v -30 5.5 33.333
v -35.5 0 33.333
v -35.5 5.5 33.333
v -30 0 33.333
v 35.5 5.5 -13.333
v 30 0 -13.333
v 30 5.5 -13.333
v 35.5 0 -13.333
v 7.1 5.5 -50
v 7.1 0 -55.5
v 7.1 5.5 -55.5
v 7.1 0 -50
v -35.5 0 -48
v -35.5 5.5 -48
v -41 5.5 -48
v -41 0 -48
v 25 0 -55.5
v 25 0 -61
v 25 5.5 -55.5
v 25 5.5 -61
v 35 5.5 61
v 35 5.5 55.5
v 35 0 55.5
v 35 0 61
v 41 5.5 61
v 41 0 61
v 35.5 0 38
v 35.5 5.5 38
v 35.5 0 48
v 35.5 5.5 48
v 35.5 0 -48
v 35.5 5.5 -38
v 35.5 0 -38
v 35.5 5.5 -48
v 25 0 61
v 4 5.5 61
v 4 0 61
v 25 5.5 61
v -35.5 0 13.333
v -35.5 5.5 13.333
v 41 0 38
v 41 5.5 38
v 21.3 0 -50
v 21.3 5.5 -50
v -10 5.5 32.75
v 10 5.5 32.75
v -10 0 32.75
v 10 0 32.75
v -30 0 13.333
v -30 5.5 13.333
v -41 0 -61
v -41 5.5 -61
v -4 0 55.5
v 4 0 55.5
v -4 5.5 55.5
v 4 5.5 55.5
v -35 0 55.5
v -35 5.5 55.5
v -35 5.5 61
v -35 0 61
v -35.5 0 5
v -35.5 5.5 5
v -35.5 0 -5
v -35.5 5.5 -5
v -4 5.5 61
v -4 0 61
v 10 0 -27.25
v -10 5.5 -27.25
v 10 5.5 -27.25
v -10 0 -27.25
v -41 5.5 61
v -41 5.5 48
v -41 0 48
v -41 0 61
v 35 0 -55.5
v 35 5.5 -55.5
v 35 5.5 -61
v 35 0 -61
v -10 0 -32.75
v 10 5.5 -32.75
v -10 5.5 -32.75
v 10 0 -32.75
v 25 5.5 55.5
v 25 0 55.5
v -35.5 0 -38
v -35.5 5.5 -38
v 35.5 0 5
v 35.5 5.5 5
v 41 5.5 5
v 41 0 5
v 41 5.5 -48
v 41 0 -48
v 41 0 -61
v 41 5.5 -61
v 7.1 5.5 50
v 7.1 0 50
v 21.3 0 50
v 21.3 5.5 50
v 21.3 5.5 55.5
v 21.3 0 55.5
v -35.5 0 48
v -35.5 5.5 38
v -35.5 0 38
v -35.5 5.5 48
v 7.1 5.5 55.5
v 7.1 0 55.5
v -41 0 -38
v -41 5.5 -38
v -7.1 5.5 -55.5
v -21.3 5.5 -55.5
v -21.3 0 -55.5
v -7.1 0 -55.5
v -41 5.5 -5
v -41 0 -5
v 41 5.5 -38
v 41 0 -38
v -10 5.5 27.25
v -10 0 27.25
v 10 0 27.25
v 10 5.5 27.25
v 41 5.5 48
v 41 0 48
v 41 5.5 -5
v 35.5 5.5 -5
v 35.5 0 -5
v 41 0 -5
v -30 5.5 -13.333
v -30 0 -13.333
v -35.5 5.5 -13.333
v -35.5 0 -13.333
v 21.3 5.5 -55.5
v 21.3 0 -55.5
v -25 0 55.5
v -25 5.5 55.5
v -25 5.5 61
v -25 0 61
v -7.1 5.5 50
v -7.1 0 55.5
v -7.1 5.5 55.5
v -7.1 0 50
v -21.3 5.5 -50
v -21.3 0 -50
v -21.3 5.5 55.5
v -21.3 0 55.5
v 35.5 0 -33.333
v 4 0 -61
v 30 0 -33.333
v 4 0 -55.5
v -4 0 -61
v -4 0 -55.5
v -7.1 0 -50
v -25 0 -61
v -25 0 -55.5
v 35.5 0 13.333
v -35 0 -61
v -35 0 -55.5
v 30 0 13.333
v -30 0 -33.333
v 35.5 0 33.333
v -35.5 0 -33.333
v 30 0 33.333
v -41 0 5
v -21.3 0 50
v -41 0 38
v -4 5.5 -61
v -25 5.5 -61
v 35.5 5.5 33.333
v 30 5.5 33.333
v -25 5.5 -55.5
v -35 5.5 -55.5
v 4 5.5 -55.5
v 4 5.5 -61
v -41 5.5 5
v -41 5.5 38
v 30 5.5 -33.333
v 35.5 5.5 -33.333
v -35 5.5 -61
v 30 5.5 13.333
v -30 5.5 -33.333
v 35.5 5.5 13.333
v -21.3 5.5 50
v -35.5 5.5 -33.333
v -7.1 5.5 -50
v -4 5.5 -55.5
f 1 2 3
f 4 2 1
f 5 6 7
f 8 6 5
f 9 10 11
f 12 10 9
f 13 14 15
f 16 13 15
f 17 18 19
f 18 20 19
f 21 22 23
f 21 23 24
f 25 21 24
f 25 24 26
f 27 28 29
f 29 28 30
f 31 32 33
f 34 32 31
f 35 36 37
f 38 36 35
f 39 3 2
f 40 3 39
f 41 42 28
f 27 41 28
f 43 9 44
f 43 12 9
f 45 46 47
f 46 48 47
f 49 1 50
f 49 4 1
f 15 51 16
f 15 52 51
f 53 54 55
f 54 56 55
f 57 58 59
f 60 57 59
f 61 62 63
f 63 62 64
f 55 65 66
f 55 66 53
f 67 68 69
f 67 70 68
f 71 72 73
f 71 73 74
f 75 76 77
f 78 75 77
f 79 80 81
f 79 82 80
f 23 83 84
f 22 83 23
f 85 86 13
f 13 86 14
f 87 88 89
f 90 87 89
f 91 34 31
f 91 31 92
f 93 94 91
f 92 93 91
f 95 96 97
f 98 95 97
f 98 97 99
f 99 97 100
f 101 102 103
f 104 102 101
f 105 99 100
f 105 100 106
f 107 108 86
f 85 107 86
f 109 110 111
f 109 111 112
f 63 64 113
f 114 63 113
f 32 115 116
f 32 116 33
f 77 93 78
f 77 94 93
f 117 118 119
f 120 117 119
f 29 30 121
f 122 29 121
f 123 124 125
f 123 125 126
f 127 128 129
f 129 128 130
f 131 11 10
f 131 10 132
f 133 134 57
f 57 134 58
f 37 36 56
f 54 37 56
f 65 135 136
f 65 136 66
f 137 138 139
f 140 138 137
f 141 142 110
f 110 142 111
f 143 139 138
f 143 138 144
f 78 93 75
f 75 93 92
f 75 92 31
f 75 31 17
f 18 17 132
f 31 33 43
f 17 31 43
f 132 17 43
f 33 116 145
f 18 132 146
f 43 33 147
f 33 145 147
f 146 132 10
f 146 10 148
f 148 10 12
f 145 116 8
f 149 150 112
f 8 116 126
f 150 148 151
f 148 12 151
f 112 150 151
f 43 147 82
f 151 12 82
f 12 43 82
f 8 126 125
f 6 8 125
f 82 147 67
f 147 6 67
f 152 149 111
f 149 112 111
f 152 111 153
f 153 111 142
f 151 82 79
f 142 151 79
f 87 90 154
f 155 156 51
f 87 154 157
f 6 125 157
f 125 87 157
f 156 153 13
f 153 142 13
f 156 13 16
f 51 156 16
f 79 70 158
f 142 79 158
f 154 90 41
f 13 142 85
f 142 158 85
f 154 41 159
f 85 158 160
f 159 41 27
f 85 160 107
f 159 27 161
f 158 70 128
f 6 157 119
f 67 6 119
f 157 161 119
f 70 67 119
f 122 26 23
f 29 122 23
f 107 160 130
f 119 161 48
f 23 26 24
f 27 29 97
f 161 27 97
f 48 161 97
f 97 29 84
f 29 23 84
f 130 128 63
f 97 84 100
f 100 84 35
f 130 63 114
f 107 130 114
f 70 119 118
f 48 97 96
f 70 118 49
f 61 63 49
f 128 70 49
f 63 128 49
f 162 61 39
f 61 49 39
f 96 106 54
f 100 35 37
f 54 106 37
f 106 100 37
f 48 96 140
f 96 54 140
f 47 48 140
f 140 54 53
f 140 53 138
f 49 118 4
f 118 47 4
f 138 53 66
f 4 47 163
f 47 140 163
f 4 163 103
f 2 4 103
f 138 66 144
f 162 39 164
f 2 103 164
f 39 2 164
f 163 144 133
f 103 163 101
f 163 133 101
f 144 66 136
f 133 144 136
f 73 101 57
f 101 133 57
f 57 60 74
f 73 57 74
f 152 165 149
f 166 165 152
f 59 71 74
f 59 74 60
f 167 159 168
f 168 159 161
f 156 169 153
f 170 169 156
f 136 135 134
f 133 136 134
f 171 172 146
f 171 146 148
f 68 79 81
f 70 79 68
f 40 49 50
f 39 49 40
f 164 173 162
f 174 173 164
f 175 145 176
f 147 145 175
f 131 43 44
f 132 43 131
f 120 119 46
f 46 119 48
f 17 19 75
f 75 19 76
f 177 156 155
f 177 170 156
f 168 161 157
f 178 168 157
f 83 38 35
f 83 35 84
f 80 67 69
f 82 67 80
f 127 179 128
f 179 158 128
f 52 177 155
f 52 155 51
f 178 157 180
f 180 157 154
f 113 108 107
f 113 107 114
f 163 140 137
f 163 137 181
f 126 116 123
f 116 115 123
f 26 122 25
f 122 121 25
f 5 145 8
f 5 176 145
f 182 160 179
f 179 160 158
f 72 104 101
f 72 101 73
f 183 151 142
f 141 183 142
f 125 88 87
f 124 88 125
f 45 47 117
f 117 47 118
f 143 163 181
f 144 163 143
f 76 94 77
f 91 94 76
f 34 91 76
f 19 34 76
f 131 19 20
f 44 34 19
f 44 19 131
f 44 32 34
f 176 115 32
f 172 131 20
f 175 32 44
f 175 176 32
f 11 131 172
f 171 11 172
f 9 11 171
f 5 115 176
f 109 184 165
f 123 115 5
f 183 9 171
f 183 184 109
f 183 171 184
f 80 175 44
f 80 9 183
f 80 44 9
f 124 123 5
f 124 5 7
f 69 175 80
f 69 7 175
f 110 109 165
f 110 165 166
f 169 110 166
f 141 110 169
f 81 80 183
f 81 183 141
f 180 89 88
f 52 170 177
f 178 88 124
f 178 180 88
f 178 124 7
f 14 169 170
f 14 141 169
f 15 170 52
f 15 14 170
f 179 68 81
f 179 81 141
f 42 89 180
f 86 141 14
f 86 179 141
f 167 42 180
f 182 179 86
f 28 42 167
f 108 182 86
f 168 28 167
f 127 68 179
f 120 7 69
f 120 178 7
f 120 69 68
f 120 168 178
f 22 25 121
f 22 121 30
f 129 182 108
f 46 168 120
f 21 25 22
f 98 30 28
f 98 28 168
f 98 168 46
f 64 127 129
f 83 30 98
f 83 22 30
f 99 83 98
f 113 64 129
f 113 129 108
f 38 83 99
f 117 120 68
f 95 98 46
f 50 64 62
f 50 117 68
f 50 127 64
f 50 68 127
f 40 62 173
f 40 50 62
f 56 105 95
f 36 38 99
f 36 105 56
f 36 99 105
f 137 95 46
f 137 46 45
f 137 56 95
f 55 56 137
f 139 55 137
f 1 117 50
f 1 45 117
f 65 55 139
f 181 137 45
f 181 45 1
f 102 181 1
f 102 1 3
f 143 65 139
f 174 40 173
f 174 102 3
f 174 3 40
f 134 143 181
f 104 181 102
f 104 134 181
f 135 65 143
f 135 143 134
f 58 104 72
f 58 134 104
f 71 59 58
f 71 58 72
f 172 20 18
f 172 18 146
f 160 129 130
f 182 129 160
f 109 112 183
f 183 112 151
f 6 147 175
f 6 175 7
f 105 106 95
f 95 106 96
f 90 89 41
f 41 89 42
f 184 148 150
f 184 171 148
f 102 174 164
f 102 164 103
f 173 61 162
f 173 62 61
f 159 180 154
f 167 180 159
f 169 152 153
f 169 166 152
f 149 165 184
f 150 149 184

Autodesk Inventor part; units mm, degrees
ref_plane "YZ Plane" through (0, 0, 0) normal (1, 0, 0) x (0, 1, 0)
ref_plane "XZ Plane" through (0, 0, 0) normal (0, 1, 0) x (-1, 0, 0)
ref_plane "XY Plane" through (0, 0, 0) normal (0, 0, 1) x (1, 0, 0)
sketch "Block1" plane through (0, 0, 0) normal (0, 0, 1) x (1, 0, 0)
  line L0 (-50, 9) -> (-39, 9)
  line L1 (-39, 9) -> (-39, 4)
  line L2 (-39, 4) -> (-50, 4)
  line L3 (-50, 4) -> (-50, 9)
  line L4 (-39, -9) -> (-39, -4)
  line L5 (-50, -9) -> (-39, -9)
  line L6 (-50, -4) -> (-50, -9)
  line L7 (-39, -4) -> (-50, -4)
  line L8 (-39, 46) -> (-39, 41)
  line L9 (-50, 46) -> (-39, 46)
  line L10 (-50, 41) -> (-50, 46)
  line L11 (-39, 41) -> (-50, 41)
  line L12 (-39, -46) -> (-39, -41)
  line L13 (-50, -46) -> (-39, -46)
  line L14 (-50, -41) -> (-50, -46)
  line L15 (-39, -41) -> (-50, -41)
  point P0 (-44.5, 0)
  dimension "d59" = 11
  dimension "d60" = 5
  dimension "d62" = 11
  dimension "d63" = 5
sketch "Block2" plane through (0, 0, 0) normal (0, 0, 1) x (1, 0, 0)
  line L0 (-7.9, 59.1) -> (7.9, 59.1)
  line L1 (7.9, 59.1) -> (7.9, 50.1)
  line L2 (7.9, 50.1) -> (23.3, 50.1)
  line L3 (23.3, 50.1) -> (23.3, 59.1)
  line L4 (23.3, 59.1) -> (39.1, 59.1)
  line L5 (39.1, 59.1) -> (39.1, 50.1)
  line L6 (39.1, 50.1) -> (50.1, 50.1)
  line L7 (50.1, 50.1) -> (50.1, 41.9)
  line L8 (50.1, 41.9) -> (41.1, 41.9)
  line L9 (41.1, 41.9) -> (41.1, 36.1)
  line L10 (41.1, 36.1) -> (50.1, 36.1)
  line L11 (50.1, 36.1) -> (50.1, 12.9)
  line L12 (50.1, 12.9) -> (41.1, 12.9)
  line L13 (41.1, 12.9) -> (41.1, 7.1)
  line L14 (41.1, 7.1) -> (50.1, 7.1)
  line L15 (50.1, 7.1) -> (50.1, -7.1)
  line L16 (50.1, -7.1) -> (41.1, -7.1)
  line L17 (41.1, -7.1) -> (41.1, -12.9)
  line L18 (41.1, -12.9) -> (50.1, -12.9)
  line L19 (50.1, -12.9) -> (50.1, -36.1)
  line L20 (50.1, -36.1) -> (41.1, -36.1)
  line L21 (41.1, -36.1) -> (41.1, -41.9)
  line L22 (41.1, -41.9) -> (50.1, -41.9)
  line L23 (50.1, -41.9) -> (50.1, -50.1)
  line L24 (50.1, -50.1) -> (39.1, -50.1)
  line L25 (39.1, -50.1) -> (39.1, -59.1)
  line L26 (39.1, -59.1) -> (23.3, -59.1)
  line L27 (23.3, -59.1) -> (23.3, -50.1)
  line L28 (23.3, -50.1) -> (7.9, -50.1)
  line L29 (7.9, -50.1) -> (7.9, -59.1)
  line L30 (7.9, -59.1) -> (-7.9, -59.1)
  line L31 (-7.9, -59.1) -> (-7.9, -50.1)
  line L32 (-7.9, -50.1) -> (-23.3, -50.1)
  line L33 (-23.3, -50.1) -> (-23.3, -59.1)
  line L34 (-23.3, -59.1) -> (-39.1, -59.1)
  line L35 (-39.1, -59.1) -> (-39.1, -50.1)
  line L36 (-39.1, -50.1) -> (-50.1, -50.1)
  line L37 (-50.1, -50.1) -> (-50.1, -41.9)
  line L38 (-50.1, -41.9) -> (-41.1, -41.9)
  line L39 (-41.1, -41.9) -> (-41.1, -36.1)
  line L40 (-41.1, -36.1) -> (-50.1, -36.1)
  line L41 (-50.1, -36.1) -> (-50.1, -12.9)
  line L42 (-50.1, -12.9) -> (-41.1, -12.9)
  line L43 (-41.1, -12.9) -> (-41.1, -7.1)
  line L44 (-41.1, -7.1) -> (-50.1, -7.1)
  line L45 (-50.1, -7.1) -> (-50.1, 7.1)
  line L46 (-50.1, 7.1) -> (-41.1, 7.1)
  line L47 (-41.1, 7.1) -> (-41.1, 12.9)
  line L48 (-41.1, 12.9) -> (-50.1, 12.9)
  line L49 (-50.1, 12.9) -> (-50.1, 36.1)
  line L50 (-50.1, 36.1) -> (-41.1, 36.1)
  line L51 (-41.1, 36.1) -> (-41.1, 41.9)
  line L52 (-41.1, 41.9) -> (-50.1, 41.9)
  line L53 (-50.1, 41.9) -> (-50.1, 50.1)
  line L54 (-50.1, 50.1) -> (-39.1, 50.1)
  line L55 (-39.1, 50.1) -> (-39.1, 59.1)
  line L56 (-39.1, 59.1) -> (-23.3, 59.1)
  line L57 (-23.3, 59.1) -> (-23.3, 50.1)
  line L58 (-23.3, 50.1) -> (-7.9, 50.1)
  line L59 (-7.9, 50.1) -> (-7.9, 59.1)
  line L60 (-29.9, 33.4333) -> (-39.1, 33.4333)
  line L61 (-39.1, 33.4333) -> (-39.1, 13.2333)
  line L62 (-39.1, 13.2333) -> (-29.9, 13.2333)
  line L63 (-29.9, 13.2333) -> (-29.9, 33.4333)
  line L64 (-29.9, -13.2333) -> (-39.1, -13.2333)
  line L65 (-39.1, -13.2333) -> (-39.1, -33.4333)
  line L66 (-39.1, -33.4333) -> (-29.9, -33.4333)
  line L67 (-29.9, -33.4333) -> (-29.9, -13.2333)
  line L68 (39.1, 33.4333) -> (39.1, 13.2333)
  line L69 (39.1, 13.2333) -> (29.9, 13.2333)
  line L70 (29.9, 13.2333) -> (29.9, 33.4333)
  line L71 (29.9, 33.4333) -> (39.1, 33.4333)
  line L72 (39.1, -13.2333) -> (29.9, -13.2333)
  line L73 (29.9, -13.2333) -> (29.9, -33.4333)
  line L74 (29.9, -33.4333) -> (39.1, -33.4333)
  line L75 (39.1, -33.4333) -> (39.1, -13.2333)
  point P0 (0, 0)
sketch "Block3" plane through (0, 0, 0) normal (0, 0, 1) x (1, 0, 0)
  line L0 (23.2, 59.2) -> (39.2, 59.2)
  line L1 (39.2, 59.2) -> (39.2, 50.2)
  line L2 (39.2, 50.2) -> (50.2, 50.2)
  line L3 (50.2, 50.2) -> (50.2, 41.8)
  line L4 (50.2, 41.8) -> (41.2, 41.8)
  line L5 (41.2, 41.8) -> (41.2, 36.2)
  line L6 (41.2, 36.2) -> (50.2, 36.2)
  line L7 (50.2, 36.2) -> (50.2, 12.8)
  line L8 (50.2, 12.8) -> (41.2, 12.8)
  line L9 (41.2, 12.8) -> (41.2, 7.2)
  line L10 (41.2, 7.2) -> (50.2, 7.2)
  line L11 (50.2, 7.2) -> (50.2, -7.2)
  line L12 (50.2, -7.2) -> (41.2, -7.2)
  line L13 (41.2, -7.2) -> (41.2, -12.8)
  line L14 (41.2, -12.8) -> (50.2, -12.8)
  line L15 (50.2, -12.8) -> (50.2, -36.2)
  line L16 (50.2, -36.2) -> (41.2, -36.2)
  line L17 (41.2, -36.2) -> (41.2, -41.8)
  line L18 (41.2, -41.8) -> (50.2, -41.8)
  line L19 (50.2, -41.8) -> (50.2, -50.2)
  line L20 (50.2, -50.2) -> (39.2, -50.2)
  line L21 (39.2, -50.2) -> (39.2, -59.2)
  line L22 (39.2, -59.2) -> (23.2, -59.2)
  line L23 (23.2, -59.2) -> (23.2, -50.2)
  line L24 (23.2, -50.2) -> (8, -50.2)
  line L25 (8, -50.2) -> (8, -59.2)
  line L26 (8, -59.2) -> (-8, -59.2)
  line L27 (-8, -59.2) -> (-8, -50.2)
  line L28 (-8, -50.2) -> (-23.2, -50.2)
  line L29 (-23.2, -50.2) -> (-23.2, -59.2)
  line L30 (-23.2, -59.2) -> (-39.2, -59.2)
  line L31 (-39.2, -59.2) -> (-39.2, -50.2)
  line L32 (-39.2, -50.2) -> (-50.2, -50.2)
  line L33 (-50.2, -50.2) -> (-50.2, -41.8)
  line L34 (-50.2, -41.8) -> (-41.2, -41.8)
  line L35 (-41.2, -41.8) -> (-41.2, -36.2)
  line L36 (-41.2, -36.2) -> (-50.2, -36.2)
  line L37 (-50.2, -36.2) -> (-50.2, -12.8)
  line L38 (-50.2, -12.8) -> (-41.2, -12.8)
  line L39 (-41.2, -12.8) -> (-41.2, -7.2)
  line L40 (-41.2, -7.2) -> (-50.2, -7.2)
  line L41 (-50.2, -7.2) -> (-50.2, 7.2)
  line L42 (-50.2, 7.2) -> (-41.2, 7.2)
  line L43 (-41.2, 7.2) -> (-41.2, 12.8)
  line L44 (-41.2, 12.8) -> (-50.2, 12.8)
  line L45 (-50.2, 12.8) -> (-50.2, 36.2)
  line L46 (-50.2, 36.2) -> (-41.2, 36.2)
  line L47 (-41.2, 36.2) -> (-41.2, 41.8)
  line L48 (-41.2, 41.8) -> (-50.2, 41.8)
  line L49 (-50.2, 41.8) -> (-50.2, 50.2)
  line L50 (-50.2, 50.2) -> (-39.2, 50.2)
  line L51 (-39.2, 50.2) -> (-39.2, 59.2)
  line L52 (-39.2, 59.2) -> (-23.2, 59.2)
  line L53 (-23.2, 59.2) -> (-23.2, 50.2)
  line L54 (-23.2, 50.2) -> (-8, 50.2)
  line L55 (-8, 50.2) -> (-8, 59.2)
  line L56 (-8, 59.2) -> (8, 59.2)
  line L57 (8, 59.2) -> (8, 50.2)
  line L58 (8, 50.2) -> (23.2, 50.2)
  line L59 (23.2, 50.2) -> (23.2, 59.2)
  line L60 (-29.8, 33.5333) -> (-39.2, 33.5333)
  line L61 (-39.2, 33.5333) -> (-39.2, 13.1333)
  line L62 (-39.2, 13.1333) -> (-29.8, 13.1333)
  line L63 (-29.8, 13.1333) -> (-29.8, 33.5333)
  line L64 (-29.8, -13.1333) -> (-39.2, -13.1333)
  line L65 (-39.2, -13.1333) -> (-39.2, -33.5333)
  line L66 (-39.2, -33.5333) -> (-29.8, -33.5333)
  line L67 (-29.8, -33.5333) -> (-29.8, -13.1333)
  line L68 (39.2, 33.5333) -> (39.2, 13.1333)
  line L69 (39.2, 13.1333) -> (29.8, 13.1333)
  line L70 (29.8, 13.1333) -> (29.8, 33.5333)
  line L71 (29.8, 33.5333) -> (39.2, 33.5333)
  line L72 (39.2, -13.1333) -> (29.8, -13.1333)
  line L73 (29.8, -13.1333) -> (29.8, -33.5333)
  line L74 (29.8, -33.5333) -> (39.2, -33.5333)
  line L75 (39.2, -33.5333) -> (39.2, -13.1333)
  point P0 (0, 0)
sketch "Block4" plane through (0, 0, 0) normal (0, 0, 1) x (1, 0, 0)
  line L0 (23.3, 59.1) -> (39.1, 59.1)
  line L1 (39.1, 59.1) -> (39.1, 50.1)
  line L2 (39.1, 50.1) -> (50.1, 50.1)
  line L3 (50.1, 50.1) -> (50.1, 41.9)
  line L4 (50.1, 41.9) -> (41.1, 41.9)
  line L5 (41.1, 41.9) -> (41.1, 36.1)
  line L6 (41.1, 36.1) -> (50.1, 36.1)
  line L7 (50.1, 36.1) -> (50.1, 12.9)
  line L8 (50.1, 12.9) -> (41.1, 12.9)
  line L9 (41.1, 12.9) -> (41.1, 7.1)
  line L10 (41.1, 7.1) -> (50.1, 7.1)
  line L11 (50.1, 7.1) -> (50.1, -7.1)
  line L12 (50.1, -7.1) -> (41.1, -7.1)
  line L13 (41.1, -7.1) -> (41.1, -12.9)
  line L14 (41.1, -12.9) -> (50.1, -12.9)
  line L15 (50.1, -12.9) -> (50.1, -36.1)
  line L16 (50.1, -36.1) -> (41.1, -36.1)
  line L17 (41.1, -36.1) -> (41.1, -41.9)
  line L18 (41.1, -41.9) -> (50.1, -41.9)
  line L19 (50.1, -41.9) -> (50.1, -50.1)
  line L20 (50.1, -50.1) -> (39.1, -50.1)
  line L21 (39.1, -50.1) -> (39.1, -59.1)
  line L22 (39.1, -59.1) -> (23.3, -59.1)
  line L23 (23.3, -59.1) -> (23.3, -50.1)
  line L24 (23.3, -50.1) -> (7.9, -50.1)
  line L25 (7.9, -50.1) -> (7.9, -59.1)
  line L26 (7.9, -59.1) -> (-7.9, -59.1)
  line L27 (-7.9, -59.1) -> (-7.9, -50.1)
  line L28 (-7.9, -50.1) -> (-23.3, -50.1)
  line L29 (-23.3, -50.1) -> (-23.3, -59.1)
  line L30 (-23.3, -59.1) -> (-39.1, -59.1)
  line L31 (-39.1, -59.1) -> (-39.1, -50.1)
  line L32 (-39.1, -50.1) -> (-50.1, -50.1)
  line L33 (-50.1, -50.1) -> (-50.1, -41.9)
  line L34 (-50.1, -41.9) -> (-41.1, -41.9)
  line L35 (-41.1, -41.9) -> (-41.1, -36.1)
  line L36 (-41.1, -36.1) -> (-50.1, -36.1)
  line L37 (-50.1, -36.1) -> (-50.1, -12.9)
  line L38 (-50.1, -12.9) -> (-41.1, -12.9)
  line L39 (-41.1, -12.9) -> (-41.1, -7.1)
  line L40 (-41.1, -7.1) -> (-50.1, -7.1)
  line L41 (-50.1, -7.1) -> (-50.1, 7.1)
  line L42 (-50.1, 7.1) -> (-41.1, 7.1)
  line L43 (-41.1, 7.1) -> (-41.1, 12.9)
  line L44 (-41.1, 12.9) -> (-50.1, 12.9)
  line L45 (-50.1, 12.9) -> (-50.1, 36.1)
  line L46 (-50.1, 36.1) -> (-41.1, 36.1)
  line L47 (-41.1, 36.1) -> (-41.1, 41.9)
  line L48 (-41.1, 41.9) -> (-50.1, 41.9)
  line L49 (-50.1, 41.9) -> (-50.1, 50.1)
  line L50 (-50.1, 50.1) -> (-39.1, 50.1)
  line L51 (-39.1, 50.1) -> (-39.1, 59.1)
  line L52 (-39.1, 59.1) -> (-23.3, 59.1)
  line L53 (-23.3, 59.1) -> (-23.3, 50.1)
  line L54 (-23.3, 50.1) -> (-7.9, 50.1)
  line L55 (-7.9, 50.1) -> (-7.9, 59.1)
  line L56 (-7.9, 59.1) -> (7.9, 59.1)
  line L57 (7.9, 59.1) -> (7.9, 50.1)
  line L58 (7.9, 50.1) -> (23.3, 50.1)
  line L59 (23.3, 50.1) -> (23.3, 59.1)
  line L60 (-29.9, 33.4333) -> (-39.1, 33.4333)
  line L61 (-39.1, 33.4333) -> (-39.1, 13.2333)
  line L62 (-39.1, 13.2333) -> (-29.9, 13.2333)
  line L63 (-29.9, 13.2333) -> (-29.9, 33.4333)
  line L64 (-29.9, -13.2333) -> (-39.1, -13.2333)
  line L65 (-39.1, -13.2333) -> (-39.1, -33.4333)
  line L66 (-39.1, -33.4333) -> (-29.9, -33.4333)
  line L67 (-29.9, -33.4333) -> (-29.9, -13.2333)
  line L68 (39.1, 33.4333) -> (39.1, 13.2333)
  line L69 (39.1, 13.2333) -> (29.9, 13.2333)
  line L70 (29.9, 13.2333) -> (29.9, 33.4333)
  line L71 (29.9, 33.4333) -> (39.1, 33.4333)
  line L72 (39.1, -13.2333) -> (29.9, -13.2333)
  line L73 (29.9, -13.2333) -> (29.9, -33.4333)
  line L74 (29.9, -33.4333) -> (39.1, -33.4333)
  line L75 (39.1, -33.4333) -> (39.1, -13.2333)
  point P0 (0, 0)
sketch "Block5" plane through (0, 0, 0) normal (0, 0, 1) x (1, 0, 0)
  line L0 (-7.18, 55.58) -> (7.18, 55.58)
  line L1 (7.18, 55.58) -> (7.18, 50.08)
  line L2 (7.18, 50.08) -> (21.22, 50.08)
  line L3 (21.22, 50.08) -> (21.22, 55.58)
  line L4 (21.22, 55.58) -> (35.58, 55.58)
  line L5 (35.58, 55.58) -> (35.58, 53.58)
  line L6 (35.58, 53.58) -> (46.58, 53.58)
  line L7 (46.58, 53.58) -> (46.58, 38.42)
  line L8 (46.58, 38.42) -> (41.08, 38.42)
  line L9 (41.08, 38.42) -> (41.08, 32.58)
  line L10 (41.08, 32.58) -> (46.58, 32.58)
  line L11 (46.58, 32.58) -> (46.58, 12.92)
  line L12 (46.58, 12.92) -> (41.08, 12.92)
  line L13 (41.08, 12.92) -> (41.08, 7.08)
  line L14 (41.08, 7.08) -> (46.58, 7.08)
  line L15 (46.58, 7.08) -> (46.58, -7.08)
  line L16 (46.58, -7.08) -> (41.08, -7.08)
  line L17 (41.08, -7.08) -> (41.08, -12.92)
  line L18 (41.08, -12.92) -> (46.58, -12.92)
  line L19 (46.58, -12.92) -> (46.58, -32.58)
  line L20 (46.58, -32.58) -> (41.08, -32.58)
  line L21 (41.08, -32.58) -> (41.08, -38.42)
  line L22 (41.08, -38.42) -> (46.58, -38.42)
  line L23 (46.58, -38.42) -> (46.58, -46.58)
  line L24 (46.58, -46.58) -> (35.58, -46.58)
  line L25 (35.58, -46.58) -> (35.58, -55.58)
  line L26 (35.58, -55.58) -> (21.22, -55.58)
  line L27 (21.22, -55.58) -> (21.22, -50.08)
  line L28 (21.22, -50.08) -> (7.18, -50.08)
  line L29 (7.18, -50.08) -> (7.18, -55.58)
  line L30 (7.18, -55.58) -> (-7.18, -55.58)
  line L31 (-7.18, -55.58) -> (-7.18, -50.08)
  line L32 (-7.18, -50.08) -> (-21.22, -50.08)
  line L33 (-21.22, -50.08) -> (-21.22, -55.58)
  line L34 (-21.22, -55.58) -> (-35.58, -55.58)
  line L35 (-35.58, -55.58) -> (-35.58, -46.58)
  line L36 (-35.58, -46.58) -> (-46.58, -46.58)
  line L37 (-46.58, -46.58) -> (-46.58, -38.42)
  line L38 (-46.58, -38.42) -> (-41.08, -38.42)
  line L39 (-41.08, -38.42) -> (-41.08, -32.58)
  line L40 (-41.08, -32.58) -> (-46.58, -32.58)
  line L41 (-46.58, -32.58) -> (-46.58, -12.92)
  line L42 (-46.58, -12.92) -> (-41.08, -12.92)
  line L43 (-41.08, -12.92) -> (-41.08, -7.08)
  line L44 (-41.08, -7.08) -> (-46.58, -7.08)
  line L45 (-46.58, -7.08) -> (-46.58, 7.08)
  line L46 (-46.58, 7.08) -> (-41.08, 7.08)
  line L47 (-41.08, 7.08) -> (-41.08, 12.92)
  line L48 (-41.08, 12.92) -> (-46.58, 12.92)
  line L49 (-46.58, 12.92) -> (-46.58, 32.58)
  line L50 (-46.58, 32.58) -> (-41.08, 32.58)
  line L51 (-41.08, 32.58) -> (-41.08, 38.42)
  line L52 (-41.08, 38.42) -> (-46.58, 38.42)
  line L53 (-46.58, 38.42) -> (-46.58, 53.58)
  line L54 (-46.58, 53.58) -> (-35.58, 53.58)
  line L55 (-35.58, 53.58) -> (-35.58, 55.58)
  line L56 (-35.58, 55.58) -> (-21.22, 55.58)
  line L57 (-21.22, 55.58) -> (-21.22, 50.08)
  line L58 (-21.22, 50.08) -> (-7.18, 50.08)
  line L59 (-7.18, 50.08) -> (-7.18, 55.58)
  line L60 (-29.92, 33.4133) -> (-35.58, 33.4133)
  line L61 (-35.58, 33.4133) -> (-35.58, 13.2533)
  line L62 (-35.58, 13.2533) -> (-29.92, 13.2533)
  line L63 (-29.92, 13.2533) -> (-29.92, 33.4133)
  line L64 (-29.92, -13.2533) -> (-35.58, -13.2533)
  line L65 (-35.58, -13.2533) -> (-35.58, -33.4133)
  line L66 (-35.58, -33.4133) -> (-29.92, -33.4133)
  line L67 (-29.92, -33.4133) -> (-29.92, -13.2533)
  line L68 (35.58, 33.4133) -> (35.58, 13.2533)
  line L69 (35.58, 13.2533) -> (29.92, 13.2533)
  line L70 (29.92, 13.2533) -> (29.92, 33.4133)
  line L71 (29.92, 33.4133) -> (35.58, 33.4133)
  line L72 (35.58, -13.2533) -> (29.92, -13.2533)
  line L73 (29.92, -13.2533) -> (29.92, -33.4133)
  line L74 (29.92, -33.4133) -> (35.58, -33.4133)
  line L75 (35.58, -33.4133) -> (35.58, -13.2533)
  point P0 (0, 0.3684)
sketch "Block6" plane through (0, 0, 0) normal (0, 0, 1) x (1, 0, 0)
  line L0 (-35.58, 55.58) -> (-21.22, 55.58)
  line L1 (-21.22, 55.58) -> (-21.22, 50.08)
  line L2 (-21.22, 50.08) -> (-7.18, 50.08)
  line L3 (-7.18, 50.08) -> (-7.18, 55.58)
  line L4 (-7.18, 55.58) -> (7.18, 55.58)
  line L5 (7.18, 55.58) -> (7.18, 50.08)
  line L6 (7.18, 50.08) -> (21.22, 50.08)
  line L7 (21.22, 50.08) -> (21.22, 55.58)
  line L8 (21.22, 55.58) -> (35.58, 55.58)
  line L9 (35.58, 55.58) -> (35.58, 53.58)
  line L10 (35.58, 53.58) -> (50.08, 53.58)
  line L11 (50.08, 53.58) -> (50.08, 37.92)
  line L12 (50.08, 37.92) -> (44.58, 37.92)
  line L13 (44.58, 37.92) -> (44.58, 32.08)
  line L14 (44.58, 32.08) -> (50.08, 32.08)
  line L15 (50.08, 32.08) -> (50.08, 12.92)
  line L16 (50.08, 12.92) -> (44.58, 12.92)
  line L17 (44.58, 12.92) -> (44.58, 7.08)
  line L18 (44.58, 7.08) -> (50.08, 7.08)
  line L19 (50.08, 7.08) -> (50.08, -7.08)
  line L20 (50.08, -7.08) -> (44.58, -7.08)
  line L21 (44.58, -7.08) -> (44.58, -12.92)
  line L22 (44.58, -12.92) -> (50.08, -12.92)
  line L23 (50.08, -12.92) -> (50.08, -32.08)
  line L24 (50.08, -32.08) -> (44.58, -32.08)
  line L25 (44.58, -32.08) -> (44.58, -37.92)
  line L26 (44.58, -37.92) -> (50.08, -37.92)
  line L27 (50.08, -37.92) -> (50.08, -46.58)
  line L28 (50.08, -46.58) -> (35.58, -46.58)
  line L29 (35.58, -46.58) -> (35.58, -55.58)
  line L30 (35.58, -55.58) -> (21.22, -55.58)
  line L31 (21.22, -55.58) -> (21.22, -50.08)
  line L32 (21.22, -50.08) -> (7.18, -50.08)
  line L33 (7.18, -50.08) -> (7.18, -55.58)
  line L34 (7.18, -55.58) -> (-7.18, -55.58)
  line L35 (-7.18, -55.58) -> (-7.18, -50.08)
  line L36 (-7.18, -50.08) -> (-21.22, -50.08)
  line L37 (-21.22, -50.08) -> (-21.22, -55.58)
  line L38 (-21.22, -55.58) -> (-35.58, -55.58)
  line L39 (-35.58, -55.58) -> (-35.58, -46.58)
  line L40 (-35.58, -46.58) -> (-50.08, -46.58)
  line L41 (-50.08, -46.58) -> (-50.08, -37.92)
  line L42 (-50.08, -37.92) -> (-44.58, -37.92)
  line L43 (-44.58, -37.92) -> (-44.58, -32.08)
  line L44 (-44.58, -32.08) -> (-50.08, -32.08)
  line L45 (-50.08, -32.08) -> (-50.08, -12.92)
  line L46 (-50.08, -12.92) -> (-44.58, -12.92)
  line L47 (-44.58, -12.92) -> (-44.58, -7.08)
  line L48 (-44.58, -7.08) -> (-50.08, -7.08)
  line L49 (-50.08, -7.08) -> (-50.08, 7.08)
  line L50 (-50.08, 7.08) -> (-44.58, 7.08)
  line L51 (-44.58, 7.08) -> (-44.58, 12.92)
  line L52 (-44.58, 12.92) -> (-50.08, 12.92)
  line L53 (-50.08, 12.92) -> (-50.08, 32.08)
  line L54 (-50.08, 32.08) -> (-44.58, 32.08)
  line L55 (-44.58, 32.08) -> (-44.58, 37.92)
  line L56 (-44.58, 37.92) -> (-50.08, 37.92)
  line L57 (-50.08, 37.92) -> (-50.08, 53.58)
  line L58 (-50.08, 53.58) -> (-35.58, 53.58)
  line L59 (-35.58, 53.58) -> (-35.58, 55.58)
  line L60 (-29.92, 33.4133) -> (-35.58, 33.4133)
  line L61 (-35.58, 33.4133) -> (-35.58, 13.2533)
  line L62 (-35.58, 13.2533) -> (-29.92, 13.2533)
  line L63 (-29.92, 13.2533) -> (-29.92, 33.4133)
  line L64 (-29.92, -13.2533) -> (-35.58, -13.2533)
  line L65 (-35.58, -13.2533) -> (-35.58, -33.4133)
  line L66 (-35.58, -33.4133) -> (-29.92, -33.4133)
  line L67 (-29.92, -33.4133) -> (-29.92, -13.2533)
  line L68 (35.58, 33.4133) -> (35.58, 13.2533)
  line L69 (35.58, 13.2533) -> (29.92, 13.2533)
  line L70 (29.92, 13.2533) -> (29.92, 33.4133)
  line L71 (29.92, 33.4133) -> (35.58, 33.4133)
  line L72 (35.58, -13.2533) -> (29.92, -13.2533)
  line L73 (29.92, -13.2533) -> (29.92, -33.4133)
  line L74 (29.92, -33.4133) -> (35.58, -33.4133)
  line L75 (35.58, -33.4133) -> (35.58, -13.2533)
  point P0 (0, 0.3684)
sketch "Sketch1" plane through (0, 0, 0) normal (0, 1, 0) x (-1, 0, 0)
  line L0 (35.5, -55.5) -> (-35.5, -55.5)
  line L1 (-35.5, -55.5) -> (-35.5, 55.5)
  line L2 (-35.5, 55.5) -> (35.5, 55.5)
  line L3 (35.5, 55.5) -> (35.5, -55.5)
  line L4 (35.5, -55.5) -> (-35.5, 55.5) construction
  line L5 (-35.5, -55.5) -> (35.5, 55.5) construction
  line L6 (0, -83.4858) -> (0, 82.8643) projected
  line L7 (94.3775, 0) -> (-215.5652, 0) projected
  point P0 (0, 0)
  point P1 (0, 0)
  point P2 (-20, 40)
  point P3 (20, 40)
  point P4 (-20, -40)
  point P5 (20, -40)
  dimension "d0" = 71
  dimension "d1" = 111
  dimension "d22" = 40
  dimension "d23" = 80
extrude "Extrusion1" add sketch "Sketch1" along normal blind 5.5
sketch "Sketch6" plane through (0, 0, 0) normal (0, -1, 0) x (1, 0, 0)
  line L0 (35.5, 55.5) -> (-35.5, 55.5) projected
  line L1 (-35.5, 55.5) -> (-35.5, -55.5) projected
  line L2 (-35.5, 33.3333) -> (-30, 33.3333)
  line L3 (-30, 33.3333) -> (-30, 13.3333)
  line L4 (-30, 13.3333) -> (-35.5, 13.3333)
  line L5 (-35.5, 13.3333) -> (-35.5, 33.3333)
  line L6 (-21.3, 55.5) -> (-7.1, 55.5)
  line L7 (-7.1, 55.5) -> (-7.1, 50)
  line L8 (-7.1, 50) -> (-21.3, 50)
  line L9 (-21.3, 50) -> (-21.3, 55.5)
  line L10 (-94.3775, 0) -> (215.5652, 0) projected
  line L11 (0, -83.4858) -> (0, 82.8643) projected
  line L12 (-35.5, -33.3333) -> (-30, -33.3333)
  line L13 (-30, -33.3333) -> (-30, -13.3333)
  line L14 (-30, -13.3333) -> (-35.5, -13.3333)
  line L15 (-35.5, -13.3333) -> (-35.5, -33.3333)
  line L16 (21.3, 55.5) -> (7.1, 55.5)
  line L17 (7.1, 55.5) -> (7.1, 50)
  line L18 (7.1, 50) -> (21.3, 50)
  line L19 (21.3, 50) -> (21.3, 55.5)
  line L20 (35.5, 33.3333) -> (30, 33.3333)
  line L21 (30, 33.3333) -> (30, 13.3333)
  line L22 (30, 13.3333) -> (35.5, 13.3333)
  line L23 (35.5, 13.3333) -> (35.5, 33.3333)
  line L24 (30, -13.3333) -> (35.5, -13.3333)
  line L25 (35.5, -33.3333) -> (30, -33.3333)
  line L26 (35.5, -13.3333) -> (35.5, -33.3333)
  line L27 (30, -33.3333) -> (30, -13.3333)
  line L28 (-21.3, -55.5) -> (-7.1, -55.5)
  line L29 (-7.1, -55.5) -> (-7.1, -50)
  line L30 (-7.1, -50) -> (-21.3, -50)
  line L31 (-21.3, -50) -> (-21.3, -55.5)
  line L32 (7.1, -50) -> (21.3, -50)
  line L33 (21.3, -55.5) -> (7.1, -55.5)
  line L34 (21.3, -50) -> (21.3, -55.5)
  line L35 (7.1, -55.5) -> (7.1, -50)
  point P0 (0, 0)
  dimension "d38" = 5.5
  dimension "d39" = 5.5
  dimension "d40" = 22.1667
  dimension "d41" = 20
  dimension "d42" = 14.2
  dimension "d43" = 14.2
extrude "Extrusion2" cut sketch "Sketch6" against normal through all contours L19 L18 L17 L0 | L14 L13 L12 L1 | L7 L8 L9 L0 | L1 L2 L3 L4 | L23 L22 L21 L20 | L24 L26 L25 L27 | L31 L30 L29 L28 | L32 L34 L33 L35
sketch "Sketch26" plane through (0, 5.5, 0) normal (0, 1, 0) x (1, 0, 0)
  line L0 (-35.5, 55.5) -> (35.5, 55.5)
  line L1 (35.5, 55.5) -> (35.5, 61)
  line L2 (35.5, 61) -> (-35.5, 61)
  line L3 (-35.5, 61) -> (-35.5, 55.5)
  line L4 (0, 84.3) -> (0, -78.8) projected
  line L5 (-49.7, 0) -> (49.7, 0) projected
  line L6 (35.5, -55.5) -> (21.3, -55.5)
  line L7 (7.1, -55.5) -> (-7.1, -55.5)
  line L8 (-21.3, -55.5) -> (-35.5, -55.5)
  line L9 (-35.5, -55.5) -> (35.5, -55.5)
  line L10 (35.5, -55.5) -> (35.5, -61)
  line L11 (35.5, -61) -> (-35.5, -61)
  line L12 (-35.5, -61) -> (-35.5, -55.5)
  line L13 (-35.5, 61) -> (-41, 61)
  line L14 (-41, 61) -> (-41, -61)
  line L15 (-41, -61) -> (-35.5, -61)
  line L16 (-35.5, -61) -> (-35.5, 61)
  line L17 (35.5, 55.5) -> (35.5, 33.3333)
  line L18 (35.5, 13.3333) -> (35.5, -13.3333)
  line L19 (35.5, -33.3333) -> (35.5, -55.5)
  line L20 (35.5, 61) -> (35.5, 55.5)
  line L21 (35.5, -61) -> (35.5, -55.5)
  line L22 (35.5, 61) -> (41, 61)
  line L23 (41, 61) -> (41, -61)
  line L24 (41, -61) -> (35.5, -61)
  line L25 (35.5, -61) -> (35.5, 61)
  point P0 (35.5, 55.5)
  point P1 (0, 0)
  dimension "d126" = 5.5
  dimension "d127" = 5.5
extrude "Extrusion13" add sketch "Sketch26" against normal blind 5.5 contours L3 L2 L4 L0 | L16 L5 L14 L13 L3 | L4 L2 L1 L0 | L16 L12 L15 L14 L5 | L1 L22 L23 L5 L18 L25 L17 | L8 L9 L7 L4 L11 L12 | L7 L9 L6 L10 L11 L4 | L5 L23 L24 L10 L19 L25 L18
sketch "Sketch27" plane through (0, 5.5, 0) normal (0, 1, 0) x (1, 0, 0)
  line L0 (-41, 61) -> (-41, -61) projected
  line L1 (-57.4, 0) -> (57.4, 0) projected
  line L2 (0, 85.4) -> (0, -85.4) projected
  line L3 (-41, 0) -> (-35.5, 0)
  line L4 (-35.5, 0) -> (-35.5, 5)
  line L5 (-35.5, 5) -> (-41, 5)
  line L6 (-41, 5) -> (-41, 0)
  line L7 (-35.5, 0) -> (-35.5, -5)
  line L8 (-35.5, -5) -> (-41, -5)
  line L9 (-41, -5) -> (-41, 0)
  line L10 (-41, 38) -> (-35.5, 38)
  line L11 (-35.5, 38) -> (-35.5, 48)
  line L12 (-35.5, 48) -> (-41, 48)
  line L13 (-41, 48) -> (-41, 38)
  line L14 (-41, -38) -> (-35.5, -38)
  line L15 (-35.5, -38) -> (-35.5, -48)
  line L16 (-35.5, -48) -> (-41, -48)
  line L17 (-41, -48) -> (-41, -38)
  line L18 (41, 0) -> (35.5, 0)
  line L19 (35.5, 0) -> (35.5, 5)
  line L20 (35.5, 5) -> (41, 5)
  line L21 (41, 5) -> (41, 0)
  line L22 (35.5, 0) -> (35.5, -5)
  line L23 (35.5, -5) -> (41, -5)
  line L24 (41, -5) -> (41, 0)
  line L25 (41, 38) -> (35.5, 38)
  line L26 (35.5, 38) -> (35.5, 48)
  line L27 (35.5, 48) -> (41, 48)
  line L28 (41, 48) -> (41, 38)
  line L29 (35.5, -38) -> (35.5, -48)
  line L30 (35.5, -48) -> (41, -48)
  line L31 (41, -48) -> (41, -38)
  line L32 (41, -38) -> (35.5, -38)
  line L33 (35.5, -33.3333) -> (35.5, -13.3333)
  line L34 (35.5, 13.3333) -> (35.5, 33.3333)
  point P0 (0, 0)
  dimension "d132" = 5
  dimension "d133" = 10
  dimension "d149" = 38
extrude "Extrusion15" cut sketch "Sketch27" against normal through all
sketch "Sketch28" plane through (0, 5.5, 0) normal (0, 1, 0) x (1, 0, 0)
  line L0 (41, 61) -> (-41, 61) projected
  line L1 (0, 61) -> (-4, 61)
  line L2 (-4, 61) -> (-4, 55.5)
  line L3 (-4, 55.5) -> (0, 55.5)
  line L4 (0, 55.5) -> (0, 61)
  line L5 (-57.4, 0) -> (57.4, 0) projected
  line L6 (0, 85.4) -> (0, -85.4) projected
  line L7 (0, 61) -> (4, 61)
  line L8 (4, 61) -> (4, 55.5)
  line L9 (4, 55.5) -> (0, 55.5)
  line L10 (-35, 61) -> (-25, 61)
  line L11 (-25, 61) -> (-25, 55.5)
  line L12 (-25, 55.5) -> (-35, 55.5)
  line L13 (-35, 55.5) -> (-35, 61)
  line L14 (35, 61) -> (25, 61)
  line L15 (25, 61) -> (25, 55.5)
  line L16 (25, 55.5) -> (35, 55.5)
  line L17 (35, 55.5) -> (35, 61)
  line L18 (0, -61) -> (-4, -61)
  line L19 (-4, -61) -> (-4, -55.5)
  line L20 (-4, -55.5) -> (0, -55.5)
  line L21 (0, -55.5) -> (0, -61)
  line L22 (4, -55.5) -> (0, -55.5)
  line L23 (4, -61) -> (4, -55.5)
  line L24 (0, -61) -> (4, -61)
  line L25 (-35, -61) -> (-25, -61)
  line L26 (-25, -61) -> (-25, -55.5)
  line L27 (-25, -55.5) -> (-35, -55.5)
  line L28 (-35, -55.5) -> (-35, -61)
  line L29 (25, -61) -> (25, -55.5)
  line L30 (35, -61) -> (25, -61)
  line L31 (35, -55.5) -> (35, -61)
  line L32 (25, -55.5) -> (35, -55.5)
  point P0 (-21.3, 55.5)
  point P1 (0, 0)
  point P2 (-21.3, -55.5)
  dimension "d139" = 4
  dimension "d140" = 5.5
  dimension "d141" = 10
  dimension "d142" = 5.5
  dimension "d148" = 25
extrude "Extrusion17" cut sketch "Sketch28" against normal through all
sketch "Sketch29" plane through (0, 0, 0) normal (0, -1, 0) x (1, 0, 0)
  line L0 (-57.4, 0) -> (57.4, 0) projected
  line L1 (0, -85.4) -> (0, 85.4) projected
  line L2 (-10, 27.25) -> (10, 27.25)
  line L3 (10, 27.25) -> (10, 32.75)
  line L4 (10, 32.75) -> (-10, 32.75)
  line L5 (-10, 32.75) -> (-10, 27.25)
  line L6 (-10, 27.25) -> (10, 32.75) construction
  line L7 (10, 27.25) -> (-10, 32.75) construction
  line L8 (-10, -27.25) -> (10, -27.25)
  line L9 (10, -27.25) -> (10, -32.75)
  line L10 (10, -32.75) -> (-10, -32.75)
  line L11 (-10, -32.75) -> (-10, -27.25)
  line L12 (-10, -27.25) -> (10, -32.75) construction
  line L13 (10, -27.25) -> (-10, -32.75) construction
  point P0 (0, 0)
  point P1 (0, 30)
  point P2 (0, -30)
  dimension "d150" = 20
  dimension "d151" = 5.5
  dimension "d152" = 60
extrude "Extrusion18" cut sketch "Sketch29" against normal through all
equation "\"d2\" = Wt"
equation "\"d38\" = Wt"
equation "\"d39\" = Wt"
equation "\"d40\" = 0.166667 * d1 + 0.666667 * Wt"
equation "\"d41\" = -0.4 * Wt + 0.2 * d1"
equation "\"d42\" = 0.2 * d0"
equation "\"d43\" = 0.2 * d0"
equation "\"hogehoge\" = 9"
equation "\"Wt\" = 5.5"
properties part number "ceil_plate" material "Wood (Birch)"
